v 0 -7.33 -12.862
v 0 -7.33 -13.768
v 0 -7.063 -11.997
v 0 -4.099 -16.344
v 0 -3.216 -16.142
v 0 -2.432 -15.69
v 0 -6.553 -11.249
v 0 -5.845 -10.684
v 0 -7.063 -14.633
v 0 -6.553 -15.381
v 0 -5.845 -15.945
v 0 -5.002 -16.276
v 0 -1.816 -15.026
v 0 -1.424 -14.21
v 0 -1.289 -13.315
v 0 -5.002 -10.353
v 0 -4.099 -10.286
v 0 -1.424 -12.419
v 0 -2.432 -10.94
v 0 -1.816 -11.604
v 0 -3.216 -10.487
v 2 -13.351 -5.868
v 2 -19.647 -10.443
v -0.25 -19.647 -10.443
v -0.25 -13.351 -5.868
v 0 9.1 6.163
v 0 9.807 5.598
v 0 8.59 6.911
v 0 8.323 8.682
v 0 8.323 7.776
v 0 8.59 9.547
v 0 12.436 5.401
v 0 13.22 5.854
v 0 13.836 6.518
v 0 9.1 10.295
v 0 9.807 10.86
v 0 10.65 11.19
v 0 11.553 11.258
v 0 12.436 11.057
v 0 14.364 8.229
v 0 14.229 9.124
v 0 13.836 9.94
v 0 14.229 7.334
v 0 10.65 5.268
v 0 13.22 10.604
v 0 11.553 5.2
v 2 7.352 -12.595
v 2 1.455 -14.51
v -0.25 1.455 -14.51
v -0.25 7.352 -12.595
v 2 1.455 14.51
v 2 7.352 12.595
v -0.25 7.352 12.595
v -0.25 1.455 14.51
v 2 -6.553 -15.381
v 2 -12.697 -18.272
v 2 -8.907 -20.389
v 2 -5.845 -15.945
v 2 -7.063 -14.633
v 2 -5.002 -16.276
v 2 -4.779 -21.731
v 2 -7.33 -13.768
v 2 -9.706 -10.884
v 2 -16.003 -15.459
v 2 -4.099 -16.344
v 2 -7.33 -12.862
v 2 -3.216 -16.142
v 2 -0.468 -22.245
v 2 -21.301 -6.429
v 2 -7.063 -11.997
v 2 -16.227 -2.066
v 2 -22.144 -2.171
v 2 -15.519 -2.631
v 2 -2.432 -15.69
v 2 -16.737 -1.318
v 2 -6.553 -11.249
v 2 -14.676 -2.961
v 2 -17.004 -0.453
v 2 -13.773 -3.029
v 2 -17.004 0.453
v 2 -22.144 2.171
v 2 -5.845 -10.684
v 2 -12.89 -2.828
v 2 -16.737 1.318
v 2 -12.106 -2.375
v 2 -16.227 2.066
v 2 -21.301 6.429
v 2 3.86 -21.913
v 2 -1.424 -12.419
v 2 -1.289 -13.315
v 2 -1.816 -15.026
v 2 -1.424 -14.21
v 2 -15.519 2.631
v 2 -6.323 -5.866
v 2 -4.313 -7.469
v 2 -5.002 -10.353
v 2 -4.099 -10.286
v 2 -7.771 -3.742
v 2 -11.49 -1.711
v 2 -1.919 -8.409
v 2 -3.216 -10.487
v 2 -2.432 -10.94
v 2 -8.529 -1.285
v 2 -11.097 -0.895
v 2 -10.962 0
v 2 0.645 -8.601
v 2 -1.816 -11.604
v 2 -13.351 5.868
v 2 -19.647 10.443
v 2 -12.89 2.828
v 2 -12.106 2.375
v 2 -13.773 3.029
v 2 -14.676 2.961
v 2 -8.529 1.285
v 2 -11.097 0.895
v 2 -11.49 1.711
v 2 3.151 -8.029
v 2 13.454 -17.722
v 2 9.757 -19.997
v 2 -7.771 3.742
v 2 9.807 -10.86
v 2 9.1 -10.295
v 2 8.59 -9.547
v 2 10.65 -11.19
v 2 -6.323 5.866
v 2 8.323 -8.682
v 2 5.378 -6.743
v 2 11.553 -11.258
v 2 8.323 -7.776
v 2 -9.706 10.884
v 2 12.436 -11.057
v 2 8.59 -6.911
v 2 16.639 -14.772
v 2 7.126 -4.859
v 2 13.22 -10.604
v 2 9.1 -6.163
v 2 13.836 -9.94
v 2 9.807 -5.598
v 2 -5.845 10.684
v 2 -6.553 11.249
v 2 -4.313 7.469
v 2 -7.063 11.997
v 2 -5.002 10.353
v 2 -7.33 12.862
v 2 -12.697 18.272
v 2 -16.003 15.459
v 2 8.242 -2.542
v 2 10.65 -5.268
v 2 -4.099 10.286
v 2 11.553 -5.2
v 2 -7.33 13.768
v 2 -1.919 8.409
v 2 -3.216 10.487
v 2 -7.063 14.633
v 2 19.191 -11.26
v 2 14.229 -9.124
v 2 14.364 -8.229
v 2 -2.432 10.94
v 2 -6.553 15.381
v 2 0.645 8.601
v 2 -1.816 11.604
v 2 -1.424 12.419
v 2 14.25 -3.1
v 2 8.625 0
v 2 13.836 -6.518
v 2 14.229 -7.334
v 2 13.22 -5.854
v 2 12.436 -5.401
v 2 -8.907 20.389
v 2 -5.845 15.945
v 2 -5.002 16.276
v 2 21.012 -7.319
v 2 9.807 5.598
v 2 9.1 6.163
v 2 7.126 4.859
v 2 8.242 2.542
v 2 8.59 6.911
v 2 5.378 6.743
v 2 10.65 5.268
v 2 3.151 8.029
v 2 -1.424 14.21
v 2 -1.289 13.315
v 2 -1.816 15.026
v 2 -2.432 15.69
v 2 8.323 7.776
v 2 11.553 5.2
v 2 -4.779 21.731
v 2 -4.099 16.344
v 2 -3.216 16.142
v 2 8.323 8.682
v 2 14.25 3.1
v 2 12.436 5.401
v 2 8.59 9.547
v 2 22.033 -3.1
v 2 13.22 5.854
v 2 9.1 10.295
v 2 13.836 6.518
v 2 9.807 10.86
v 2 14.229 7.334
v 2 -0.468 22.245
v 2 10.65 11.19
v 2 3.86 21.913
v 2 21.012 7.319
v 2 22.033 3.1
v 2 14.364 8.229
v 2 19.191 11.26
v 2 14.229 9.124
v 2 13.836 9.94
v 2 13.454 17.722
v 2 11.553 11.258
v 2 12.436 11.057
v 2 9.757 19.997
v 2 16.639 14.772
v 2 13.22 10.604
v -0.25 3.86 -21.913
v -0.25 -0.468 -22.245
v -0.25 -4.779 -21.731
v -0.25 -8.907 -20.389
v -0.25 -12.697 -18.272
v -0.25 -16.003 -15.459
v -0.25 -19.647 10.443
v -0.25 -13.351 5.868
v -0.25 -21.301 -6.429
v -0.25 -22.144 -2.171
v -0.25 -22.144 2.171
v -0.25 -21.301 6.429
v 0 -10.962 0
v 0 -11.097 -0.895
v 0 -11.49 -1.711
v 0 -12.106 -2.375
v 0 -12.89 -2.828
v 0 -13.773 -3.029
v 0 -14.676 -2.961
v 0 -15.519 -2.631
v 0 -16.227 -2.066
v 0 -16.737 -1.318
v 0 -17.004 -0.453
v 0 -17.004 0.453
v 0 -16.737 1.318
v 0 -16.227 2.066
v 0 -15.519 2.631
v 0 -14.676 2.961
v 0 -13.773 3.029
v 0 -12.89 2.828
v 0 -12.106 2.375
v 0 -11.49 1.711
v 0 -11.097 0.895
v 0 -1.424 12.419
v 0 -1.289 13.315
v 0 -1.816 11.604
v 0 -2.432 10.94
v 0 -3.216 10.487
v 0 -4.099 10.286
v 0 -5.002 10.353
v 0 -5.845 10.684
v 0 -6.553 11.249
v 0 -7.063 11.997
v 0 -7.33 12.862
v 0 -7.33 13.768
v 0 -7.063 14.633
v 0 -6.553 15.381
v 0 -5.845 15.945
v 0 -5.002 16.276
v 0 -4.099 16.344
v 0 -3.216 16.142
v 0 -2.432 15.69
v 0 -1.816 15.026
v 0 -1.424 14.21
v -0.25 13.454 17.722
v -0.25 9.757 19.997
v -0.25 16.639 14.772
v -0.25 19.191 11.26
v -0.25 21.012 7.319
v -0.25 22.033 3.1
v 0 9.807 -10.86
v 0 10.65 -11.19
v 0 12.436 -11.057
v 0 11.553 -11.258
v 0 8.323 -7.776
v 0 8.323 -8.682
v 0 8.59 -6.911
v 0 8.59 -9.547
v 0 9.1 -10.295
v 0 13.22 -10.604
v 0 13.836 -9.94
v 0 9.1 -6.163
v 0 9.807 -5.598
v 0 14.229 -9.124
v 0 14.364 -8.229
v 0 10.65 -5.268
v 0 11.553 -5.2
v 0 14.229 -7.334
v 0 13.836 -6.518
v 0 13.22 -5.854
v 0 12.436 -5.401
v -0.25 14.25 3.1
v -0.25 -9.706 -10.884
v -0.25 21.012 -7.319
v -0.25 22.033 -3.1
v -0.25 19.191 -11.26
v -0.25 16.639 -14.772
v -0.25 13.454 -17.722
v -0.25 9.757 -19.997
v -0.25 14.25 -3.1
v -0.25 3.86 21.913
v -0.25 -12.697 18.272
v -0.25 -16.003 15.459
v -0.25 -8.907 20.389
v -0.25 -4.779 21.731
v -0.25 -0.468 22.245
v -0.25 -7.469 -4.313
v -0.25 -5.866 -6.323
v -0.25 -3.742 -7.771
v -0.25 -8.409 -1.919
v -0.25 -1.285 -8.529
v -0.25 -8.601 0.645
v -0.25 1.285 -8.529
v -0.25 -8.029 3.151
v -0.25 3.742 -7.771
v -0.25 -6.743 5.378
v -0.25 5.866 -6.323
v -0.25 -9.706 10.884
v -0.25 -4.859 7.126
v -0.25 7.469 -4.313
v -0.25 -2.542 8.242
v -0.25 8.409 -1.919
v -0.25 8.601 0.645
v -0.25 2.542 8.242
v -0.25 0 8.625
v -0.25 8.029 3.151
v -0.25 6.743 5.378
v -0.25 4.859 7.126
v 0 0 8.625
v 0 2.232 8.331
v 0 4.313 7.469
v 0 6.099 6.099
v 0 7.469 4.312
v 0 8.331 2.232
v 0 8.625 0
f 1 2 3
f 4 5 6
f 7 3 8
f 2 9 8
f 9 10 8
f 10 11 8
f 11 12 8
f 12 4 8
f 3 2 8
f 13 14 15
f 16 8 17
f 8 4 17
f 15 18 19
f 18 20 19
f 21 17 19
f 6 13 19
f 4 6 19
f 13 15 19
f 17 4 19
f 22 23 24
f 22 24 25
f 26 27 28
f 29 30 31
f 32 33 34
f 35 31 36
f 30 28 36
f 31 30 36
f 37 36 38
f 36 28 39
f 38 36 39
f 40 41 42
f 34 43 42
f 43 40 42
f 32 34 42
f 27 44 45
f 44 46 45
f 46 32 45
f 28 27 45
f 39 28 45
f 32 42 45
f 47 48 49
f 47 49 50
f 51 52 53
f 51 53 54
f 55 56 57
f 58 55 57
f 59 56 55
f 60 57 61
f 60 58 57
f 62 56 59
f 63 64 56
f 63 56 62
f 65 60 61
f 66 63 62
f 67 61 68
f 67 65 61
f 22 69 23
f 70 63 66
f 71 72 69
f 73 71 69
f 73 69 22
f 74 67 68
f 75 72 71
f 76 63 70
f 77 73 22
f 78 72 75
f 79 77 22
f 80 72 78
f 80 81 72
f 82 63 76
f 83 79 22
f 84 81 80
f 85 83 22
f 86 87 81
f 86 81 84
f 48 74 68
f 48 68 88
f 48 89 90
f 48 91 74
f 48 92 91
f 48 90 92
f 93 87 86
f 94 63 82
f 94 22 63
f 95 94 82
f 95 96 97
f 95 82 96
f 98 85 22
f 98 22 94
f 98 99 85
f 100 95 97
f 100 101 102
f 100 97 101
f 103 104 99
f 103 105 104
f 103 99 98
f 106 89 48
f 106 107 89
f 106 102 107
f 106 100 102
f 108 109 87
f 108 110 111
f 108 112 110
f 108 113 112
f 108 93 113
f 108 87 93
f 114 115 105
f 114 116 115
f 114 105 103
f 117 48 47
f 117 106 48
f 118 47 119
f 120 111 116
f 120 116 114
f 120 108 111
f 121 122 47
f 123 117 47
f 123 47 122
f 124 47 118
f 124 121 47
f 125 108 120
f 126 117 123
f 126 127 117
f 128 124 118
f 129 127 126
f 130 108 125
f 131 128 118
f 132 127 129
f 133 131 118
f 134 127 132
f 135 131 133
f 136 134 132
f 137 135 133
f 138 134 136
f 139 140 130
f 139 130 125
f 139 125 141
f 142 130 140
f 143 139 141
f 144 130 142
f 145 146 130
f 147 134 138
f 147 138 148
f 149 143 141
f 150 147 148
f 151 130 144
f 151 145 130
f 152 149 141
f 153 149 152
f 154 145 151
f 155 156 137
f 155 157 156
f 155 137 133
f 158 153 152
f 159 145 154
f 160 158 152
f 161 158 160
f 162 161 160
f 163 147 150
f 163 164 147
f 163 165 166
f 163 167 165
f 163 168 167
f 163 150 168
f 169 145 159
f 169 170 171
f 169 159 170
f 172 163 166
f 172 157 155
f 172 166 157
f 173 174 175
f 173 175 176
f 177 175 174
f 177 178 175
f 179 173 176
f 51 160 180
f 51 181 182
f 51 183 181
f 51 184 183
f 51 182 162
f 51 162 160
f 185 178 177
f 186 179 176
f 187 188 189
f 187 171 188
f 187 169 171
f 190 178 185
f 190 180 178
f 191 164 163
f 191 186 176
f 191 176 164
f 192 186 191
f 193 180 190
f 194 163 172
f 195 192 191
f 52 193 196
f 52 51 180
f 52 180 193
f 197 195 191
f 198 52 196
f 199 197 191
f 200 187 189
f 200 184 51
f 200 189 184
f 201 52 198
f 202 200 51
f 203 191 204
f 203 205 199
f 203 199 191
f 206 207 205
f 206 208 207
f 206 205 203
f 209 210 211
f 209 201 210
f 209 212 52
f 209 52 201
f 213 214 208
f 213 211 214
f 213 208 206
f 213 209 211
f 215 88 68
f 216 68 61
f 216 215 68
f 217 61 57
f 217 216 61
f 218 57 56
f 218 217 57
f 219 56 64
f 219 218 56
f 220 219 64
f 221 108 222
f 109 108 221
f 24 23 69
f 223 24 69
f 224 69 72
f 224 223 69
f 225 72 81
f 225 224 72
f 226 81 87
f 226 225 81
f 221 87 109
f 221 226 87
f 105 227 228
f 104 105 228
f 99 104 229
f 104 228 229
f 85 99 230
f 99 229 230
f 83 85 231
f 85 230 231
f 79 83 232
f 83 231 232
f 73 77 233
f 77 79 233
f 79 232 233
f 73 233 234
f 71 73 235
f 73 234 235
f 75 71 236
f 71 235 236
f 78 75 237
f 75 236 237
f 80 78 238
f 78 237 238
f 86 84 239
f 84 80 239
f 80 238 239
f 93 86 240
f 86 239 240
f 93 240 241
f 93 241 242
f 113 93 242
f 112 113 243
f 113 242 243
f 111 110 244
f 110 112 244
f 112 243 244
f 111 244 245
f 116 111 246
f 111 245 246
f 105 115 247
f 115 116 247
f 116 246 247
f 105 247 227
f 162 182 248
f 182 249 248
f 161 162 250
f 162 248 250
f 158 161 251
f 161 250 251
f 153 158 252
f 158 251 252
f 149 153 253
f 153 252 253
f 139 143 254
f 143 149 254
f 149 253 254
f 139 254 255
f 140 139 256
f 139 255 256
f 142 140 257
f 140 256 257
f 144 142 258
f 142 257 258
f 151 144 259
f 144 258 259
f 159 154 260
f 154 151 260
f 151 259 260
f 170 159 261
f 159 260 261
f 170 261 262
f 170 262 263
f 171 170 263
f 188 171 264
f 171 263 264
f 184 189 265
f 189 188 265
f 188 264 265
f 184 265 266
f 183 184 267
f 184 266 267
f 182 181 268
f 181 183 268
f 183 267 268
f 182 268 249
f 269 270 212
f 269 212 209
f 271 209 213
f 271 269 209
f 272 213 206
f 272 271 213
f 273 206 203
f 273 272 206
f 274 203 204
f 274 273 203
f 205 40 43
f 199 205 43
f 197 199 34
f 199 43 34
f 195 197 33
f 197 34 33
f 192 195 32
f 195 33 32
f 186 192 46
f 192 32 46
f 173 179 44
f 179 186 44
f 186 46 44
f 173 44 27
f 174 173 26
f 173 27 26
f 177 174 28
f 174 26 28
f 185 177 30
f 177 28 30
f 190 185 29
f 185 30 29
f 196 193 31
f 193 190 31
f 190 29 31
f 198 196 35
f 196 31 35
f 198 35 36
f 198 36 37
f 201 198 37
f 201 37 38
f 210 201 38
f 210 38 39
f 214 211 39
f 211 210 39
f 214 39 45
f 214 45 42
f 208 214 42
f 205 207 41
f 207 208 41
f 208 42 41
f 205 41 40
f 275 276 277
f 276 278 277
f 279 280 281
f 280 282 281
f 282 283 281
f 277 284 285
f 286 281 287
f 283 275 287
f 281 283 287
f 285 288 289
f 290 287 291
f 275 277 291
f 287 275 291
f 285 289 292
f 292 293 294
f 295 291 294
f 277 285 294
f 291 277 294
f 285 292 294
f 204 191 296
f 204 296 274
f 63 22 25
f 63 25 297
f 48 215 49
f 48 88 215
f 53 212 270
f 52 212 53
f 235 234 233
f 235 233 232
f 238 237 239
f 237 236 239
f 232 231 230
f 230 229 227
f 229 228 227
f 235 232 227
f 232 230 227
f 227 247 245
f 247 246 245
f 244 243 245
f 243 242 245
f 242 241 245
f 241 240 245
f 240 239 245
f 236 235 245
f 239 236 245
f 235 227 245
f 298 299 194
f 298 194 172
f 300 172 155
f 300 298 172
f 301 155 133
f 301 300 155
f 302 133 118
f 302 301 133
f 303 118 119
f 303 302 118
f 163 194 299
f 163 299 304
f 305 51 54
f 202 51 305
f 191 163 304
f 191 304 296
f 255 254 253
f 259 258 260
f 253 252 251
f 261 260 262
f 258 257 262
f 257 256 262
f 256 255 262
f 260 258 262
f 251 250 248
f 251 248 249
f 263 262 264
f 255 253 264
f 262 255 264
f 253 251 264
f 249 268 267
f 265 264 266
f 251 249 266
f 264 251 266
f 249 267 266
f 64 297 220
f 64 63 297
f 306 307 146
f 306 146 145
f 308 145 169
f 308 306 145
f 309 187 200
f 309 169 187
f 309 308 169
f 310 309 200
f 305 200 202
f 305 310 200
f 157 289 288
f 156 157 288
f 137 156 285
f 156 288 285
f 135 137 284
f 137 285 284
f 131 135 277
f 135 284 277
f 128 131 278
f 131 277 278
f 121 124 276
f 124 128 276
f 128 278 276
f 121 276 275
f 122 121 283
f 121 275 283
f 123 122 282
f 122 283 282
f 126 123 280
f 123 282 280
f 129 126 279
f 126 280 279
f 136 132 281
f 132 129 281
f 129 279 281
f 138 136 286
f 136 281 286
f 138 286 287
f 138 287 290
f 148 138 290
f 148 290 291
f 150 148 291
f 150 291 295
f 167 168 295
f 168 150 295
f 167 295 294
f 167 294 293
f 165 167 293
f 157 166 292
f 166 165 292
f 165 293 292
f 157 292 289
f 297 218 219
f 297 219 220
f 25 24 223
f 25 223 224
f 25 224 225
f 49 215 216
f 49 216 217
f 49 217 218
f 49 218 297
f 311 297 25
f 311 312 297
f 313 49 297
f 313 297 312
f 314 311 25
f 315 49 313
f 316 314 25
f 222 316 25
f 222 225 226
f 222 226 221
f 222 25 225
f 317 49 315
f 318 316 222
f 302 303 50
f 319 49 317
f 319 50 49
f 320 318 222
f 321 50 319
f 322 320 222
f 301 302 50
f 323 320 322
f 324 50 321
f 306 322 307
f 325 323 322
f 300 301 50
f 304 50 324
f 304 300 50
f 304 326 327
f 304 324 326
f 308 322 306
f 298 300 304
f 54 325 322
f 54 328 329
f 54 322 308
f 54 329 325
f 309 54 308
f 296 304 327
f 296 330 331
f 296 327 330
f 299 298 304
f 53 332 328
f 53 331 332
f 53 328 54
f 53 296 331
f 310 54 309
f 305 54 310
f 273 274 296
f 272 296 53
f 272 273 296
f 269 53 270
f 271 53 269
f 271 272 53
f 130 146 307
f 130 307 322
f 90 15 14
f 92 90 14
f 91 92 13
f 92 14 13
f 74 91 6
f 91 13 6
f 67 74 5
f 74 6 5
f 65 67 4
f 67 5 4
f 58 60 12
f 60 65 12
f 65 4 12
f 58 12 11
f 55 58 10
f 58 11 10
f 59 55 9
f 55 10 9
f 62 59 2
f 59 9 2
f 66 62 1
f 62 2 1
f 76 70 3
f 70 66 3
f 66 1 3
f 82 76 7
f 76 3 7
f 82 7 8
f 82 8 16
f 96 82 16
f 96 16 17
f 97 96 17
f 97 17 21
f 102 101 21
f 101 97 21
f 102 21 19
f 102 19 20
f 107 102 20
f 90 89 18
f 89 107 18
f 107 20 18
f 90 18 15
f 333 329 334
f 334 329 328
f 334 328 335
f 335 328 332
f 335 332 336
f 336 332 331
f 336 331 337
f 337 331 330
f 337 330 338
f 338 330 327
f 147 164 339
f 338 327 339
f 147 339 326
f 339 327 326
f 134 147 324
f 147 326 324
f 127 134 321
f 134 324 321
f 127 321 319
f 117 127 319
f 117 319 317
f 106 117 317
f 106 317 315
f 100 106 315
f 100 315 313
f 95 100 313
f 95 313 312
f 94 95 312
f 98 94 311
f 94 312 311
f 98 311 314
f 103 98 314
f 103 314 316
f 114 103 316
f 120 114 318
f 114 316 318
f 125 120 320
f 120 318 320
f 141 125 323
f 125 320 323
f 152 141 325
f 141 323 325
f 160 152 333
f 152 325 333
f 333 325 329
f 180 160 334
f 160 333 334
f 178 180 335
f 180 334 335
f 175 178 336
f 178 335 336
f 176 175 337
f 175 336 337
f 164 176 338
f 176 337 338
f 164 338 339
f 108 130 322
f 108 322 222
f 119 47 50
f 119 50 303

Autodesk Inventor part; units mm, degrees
ref_plane "YZ Plane" through (0, 0, 0) normal (1, 0, 0) x (0, 1, 0)
ref_plane "XZ Plane" through (0, 0, 0) normal (0, 1, 0) x (-1, 0, 0)
ref_plane "XY Plane" through (0, 0, 0) normal (0, 0, 1) x (1, 0, 0)
sketch "Sketch1" plane through (0, 0, 0) normal (1, 0, 0) x (0, 1, 0)
  circle A0 centre (0, 0) radius 22.25
  circle A1 centre (0, 0) radius 8.625
  line L0 (8.625, 0) -> (22.25, 0) construction
  line L1 (21.91, 3.875) -> (7.7055, 3.875) construction
  line L2 (7.7055, -3.875) -> (21.91, -3.875) construction
  circle A2 centre (-14, 0) radius 3.0375
  circle A3 centre (-4.3262, -13.3148) radius 3.0375
  circle A4 centre (11.3262, -8.229) radius 3.0375
  circle A5 centre (11.3262, 8.229) radius 3.0375
  circle A6 centre (-4.3262, 13.3148) radius 3.0375
  dimension "d0" = 44.5
  dimension "d1" = 17.25
  dimension "d2" = 7.75
  dimension "d3" = 3.875
  dimension "d4" = 0
  dimension "d5" = 6.075
  dimension "d32" = 14
  dimension "d35" = 360
extrude "Extrusion1" add sketch "Sketch1" along normal blind 2
sketch "Sketch2" plane through (0, 0, 0) normal (-1, 0, 0) x (0, 0, 1)
  circle A0 centre (0, 0) radius 8.625 projected
  circle A1 centre (0, 0) radius 22.25 projected
extrude "Extrusion2" add sketch "Sketch2" along normal blind 0.25
sketch "Sketch3" plane through (2, 0, 0) normal (1, 0, 0) x (0, 0, -1)
  line L0 (-3.1, 26.8099) -> (3.1, 26.8099)
  line L1 (3.1, 26.8099) -> (3.1, 14.25)
  line L2 (3.1, 14.25) -> (-3.1, 14.25)
  line L3 (-3.1, 14.25) -> (-3.1, 26.8099)
  circle A0 centre (0, 0) radius 22.25 construction
  line L4 (-2.05, 26.8099) -> (2.05, 26.8099)
  line L5 (2.05, 26.8099) -> (2.05, 14.25)
  line L6 (2.05, 14.25) -> (-2.05, 14.25)
  line L7 (-2.05, 14.25) -> (-2.05, 26.8099)
  line L8 (-26.4557, 5.3365) -> (-24.5398, 11.233)
  line L9 (-24.5398, 11.233) -> (-12.5946, 7.3518)
  line L10 (-12.5946, 7.3518) -> (-14.5105, 1.4552)
  line L11 (-14.5105, 1.4552) -> (-26.4557, 5.3365)
  line L12 (-26.1313, 6.3351) -> (-24.8643, 10.2344)
  line L13 (-24.8643, 10.2344) -> (-12.9191, 6.3532)
  line L14 (-12.9191, 6.3532) -> (-14.186, 2.4538)
  line L15 (-14.186, 2.4538) -> (-26.1313, 6.3351)
  line L16 (-13.2505, -23.5118) -> (-18.2664, -19.8676)
  line L17 (-18.2664, -19.8676) -> (-10.8839, -9.7064)
  line L18 (-10.8839, -9.7064) -> (-5.868, -13.3506)
  line L19 (-5.868, -13.3506) -> (-13.2505, -23.5118)
  line L20 (-14.1, -22.8947) -> (-17.417, -20.4847)
  line L21 (-17.417, -20.4847) -> (-10.0344, -10.3235)
  line L22 (-10.0344, -10.3235) -> (-6.7175, -12.7335)
  line L23 (-6.7175, -12.7335) -> (-14.1, -22.8947)
  line L24 (18.2664, -19.8676) -> (13.2505, -23.5118)
  line L25 (13.2505, -23.5118) -> (5.868, -13.3506)
  line L26 (5.868, -13.3506) -> (10.8839, -9.7064)
  line L27 (10.8839, -9.7064) -> (18.2664, -19.8676)
  line L28 (17.417, -20.4847) -> (14.1, -22.8947)
  line L29 (14.1, -22.8947) -> (6.7175, -12.7335)
  line L30 (6.7175, -12.7335) -> (10.0344, -10.3235)
  line L31 (10.0344, -10.3235) -> (17.417, -20.4847)
  line L32 (24.5398, 11.233) -> (26.4557, 5.3365)
  line L33 (26.4557, 5.3365) -> (14.5105, 1.4552)
  line L34 (14.5105, 1.4552) -> (12.5946, 7.3518)
  line L35 (12.5946, 7.3518) -> (24.5398, 11.233)
  line L36 (24.8643, 10.2344) -> (26.1313, 6.3351)
  line L37 (26.1313, 6.3351) -> (14.186, 2.4538)
  line L38 (14.186, 2.4538) -> (12.9191, 6.3532)
  line L39 (12.9191, 6.3532) -> (24.8643, 10.2344)
  dimension "d15" = 6.2
  dimension "d16" = 3.1
  dimension "d17" = 8
  dimension "d22" = 0
  dimension "d23" = 0
  dimension "d24" = 1.05
  dimension "d25" = 1.05
  dimension "d28" = 360
extrude "Extrusion3" cut sketch "Sketch3" against normal up to surface (2.25 mm away)
equation "\"d3\" = 0.5 * d2"
equation "\"d16\" = 0.5 * d15"
equation "\"d25\" = d24"
properties part number "Magnetic Disk"
